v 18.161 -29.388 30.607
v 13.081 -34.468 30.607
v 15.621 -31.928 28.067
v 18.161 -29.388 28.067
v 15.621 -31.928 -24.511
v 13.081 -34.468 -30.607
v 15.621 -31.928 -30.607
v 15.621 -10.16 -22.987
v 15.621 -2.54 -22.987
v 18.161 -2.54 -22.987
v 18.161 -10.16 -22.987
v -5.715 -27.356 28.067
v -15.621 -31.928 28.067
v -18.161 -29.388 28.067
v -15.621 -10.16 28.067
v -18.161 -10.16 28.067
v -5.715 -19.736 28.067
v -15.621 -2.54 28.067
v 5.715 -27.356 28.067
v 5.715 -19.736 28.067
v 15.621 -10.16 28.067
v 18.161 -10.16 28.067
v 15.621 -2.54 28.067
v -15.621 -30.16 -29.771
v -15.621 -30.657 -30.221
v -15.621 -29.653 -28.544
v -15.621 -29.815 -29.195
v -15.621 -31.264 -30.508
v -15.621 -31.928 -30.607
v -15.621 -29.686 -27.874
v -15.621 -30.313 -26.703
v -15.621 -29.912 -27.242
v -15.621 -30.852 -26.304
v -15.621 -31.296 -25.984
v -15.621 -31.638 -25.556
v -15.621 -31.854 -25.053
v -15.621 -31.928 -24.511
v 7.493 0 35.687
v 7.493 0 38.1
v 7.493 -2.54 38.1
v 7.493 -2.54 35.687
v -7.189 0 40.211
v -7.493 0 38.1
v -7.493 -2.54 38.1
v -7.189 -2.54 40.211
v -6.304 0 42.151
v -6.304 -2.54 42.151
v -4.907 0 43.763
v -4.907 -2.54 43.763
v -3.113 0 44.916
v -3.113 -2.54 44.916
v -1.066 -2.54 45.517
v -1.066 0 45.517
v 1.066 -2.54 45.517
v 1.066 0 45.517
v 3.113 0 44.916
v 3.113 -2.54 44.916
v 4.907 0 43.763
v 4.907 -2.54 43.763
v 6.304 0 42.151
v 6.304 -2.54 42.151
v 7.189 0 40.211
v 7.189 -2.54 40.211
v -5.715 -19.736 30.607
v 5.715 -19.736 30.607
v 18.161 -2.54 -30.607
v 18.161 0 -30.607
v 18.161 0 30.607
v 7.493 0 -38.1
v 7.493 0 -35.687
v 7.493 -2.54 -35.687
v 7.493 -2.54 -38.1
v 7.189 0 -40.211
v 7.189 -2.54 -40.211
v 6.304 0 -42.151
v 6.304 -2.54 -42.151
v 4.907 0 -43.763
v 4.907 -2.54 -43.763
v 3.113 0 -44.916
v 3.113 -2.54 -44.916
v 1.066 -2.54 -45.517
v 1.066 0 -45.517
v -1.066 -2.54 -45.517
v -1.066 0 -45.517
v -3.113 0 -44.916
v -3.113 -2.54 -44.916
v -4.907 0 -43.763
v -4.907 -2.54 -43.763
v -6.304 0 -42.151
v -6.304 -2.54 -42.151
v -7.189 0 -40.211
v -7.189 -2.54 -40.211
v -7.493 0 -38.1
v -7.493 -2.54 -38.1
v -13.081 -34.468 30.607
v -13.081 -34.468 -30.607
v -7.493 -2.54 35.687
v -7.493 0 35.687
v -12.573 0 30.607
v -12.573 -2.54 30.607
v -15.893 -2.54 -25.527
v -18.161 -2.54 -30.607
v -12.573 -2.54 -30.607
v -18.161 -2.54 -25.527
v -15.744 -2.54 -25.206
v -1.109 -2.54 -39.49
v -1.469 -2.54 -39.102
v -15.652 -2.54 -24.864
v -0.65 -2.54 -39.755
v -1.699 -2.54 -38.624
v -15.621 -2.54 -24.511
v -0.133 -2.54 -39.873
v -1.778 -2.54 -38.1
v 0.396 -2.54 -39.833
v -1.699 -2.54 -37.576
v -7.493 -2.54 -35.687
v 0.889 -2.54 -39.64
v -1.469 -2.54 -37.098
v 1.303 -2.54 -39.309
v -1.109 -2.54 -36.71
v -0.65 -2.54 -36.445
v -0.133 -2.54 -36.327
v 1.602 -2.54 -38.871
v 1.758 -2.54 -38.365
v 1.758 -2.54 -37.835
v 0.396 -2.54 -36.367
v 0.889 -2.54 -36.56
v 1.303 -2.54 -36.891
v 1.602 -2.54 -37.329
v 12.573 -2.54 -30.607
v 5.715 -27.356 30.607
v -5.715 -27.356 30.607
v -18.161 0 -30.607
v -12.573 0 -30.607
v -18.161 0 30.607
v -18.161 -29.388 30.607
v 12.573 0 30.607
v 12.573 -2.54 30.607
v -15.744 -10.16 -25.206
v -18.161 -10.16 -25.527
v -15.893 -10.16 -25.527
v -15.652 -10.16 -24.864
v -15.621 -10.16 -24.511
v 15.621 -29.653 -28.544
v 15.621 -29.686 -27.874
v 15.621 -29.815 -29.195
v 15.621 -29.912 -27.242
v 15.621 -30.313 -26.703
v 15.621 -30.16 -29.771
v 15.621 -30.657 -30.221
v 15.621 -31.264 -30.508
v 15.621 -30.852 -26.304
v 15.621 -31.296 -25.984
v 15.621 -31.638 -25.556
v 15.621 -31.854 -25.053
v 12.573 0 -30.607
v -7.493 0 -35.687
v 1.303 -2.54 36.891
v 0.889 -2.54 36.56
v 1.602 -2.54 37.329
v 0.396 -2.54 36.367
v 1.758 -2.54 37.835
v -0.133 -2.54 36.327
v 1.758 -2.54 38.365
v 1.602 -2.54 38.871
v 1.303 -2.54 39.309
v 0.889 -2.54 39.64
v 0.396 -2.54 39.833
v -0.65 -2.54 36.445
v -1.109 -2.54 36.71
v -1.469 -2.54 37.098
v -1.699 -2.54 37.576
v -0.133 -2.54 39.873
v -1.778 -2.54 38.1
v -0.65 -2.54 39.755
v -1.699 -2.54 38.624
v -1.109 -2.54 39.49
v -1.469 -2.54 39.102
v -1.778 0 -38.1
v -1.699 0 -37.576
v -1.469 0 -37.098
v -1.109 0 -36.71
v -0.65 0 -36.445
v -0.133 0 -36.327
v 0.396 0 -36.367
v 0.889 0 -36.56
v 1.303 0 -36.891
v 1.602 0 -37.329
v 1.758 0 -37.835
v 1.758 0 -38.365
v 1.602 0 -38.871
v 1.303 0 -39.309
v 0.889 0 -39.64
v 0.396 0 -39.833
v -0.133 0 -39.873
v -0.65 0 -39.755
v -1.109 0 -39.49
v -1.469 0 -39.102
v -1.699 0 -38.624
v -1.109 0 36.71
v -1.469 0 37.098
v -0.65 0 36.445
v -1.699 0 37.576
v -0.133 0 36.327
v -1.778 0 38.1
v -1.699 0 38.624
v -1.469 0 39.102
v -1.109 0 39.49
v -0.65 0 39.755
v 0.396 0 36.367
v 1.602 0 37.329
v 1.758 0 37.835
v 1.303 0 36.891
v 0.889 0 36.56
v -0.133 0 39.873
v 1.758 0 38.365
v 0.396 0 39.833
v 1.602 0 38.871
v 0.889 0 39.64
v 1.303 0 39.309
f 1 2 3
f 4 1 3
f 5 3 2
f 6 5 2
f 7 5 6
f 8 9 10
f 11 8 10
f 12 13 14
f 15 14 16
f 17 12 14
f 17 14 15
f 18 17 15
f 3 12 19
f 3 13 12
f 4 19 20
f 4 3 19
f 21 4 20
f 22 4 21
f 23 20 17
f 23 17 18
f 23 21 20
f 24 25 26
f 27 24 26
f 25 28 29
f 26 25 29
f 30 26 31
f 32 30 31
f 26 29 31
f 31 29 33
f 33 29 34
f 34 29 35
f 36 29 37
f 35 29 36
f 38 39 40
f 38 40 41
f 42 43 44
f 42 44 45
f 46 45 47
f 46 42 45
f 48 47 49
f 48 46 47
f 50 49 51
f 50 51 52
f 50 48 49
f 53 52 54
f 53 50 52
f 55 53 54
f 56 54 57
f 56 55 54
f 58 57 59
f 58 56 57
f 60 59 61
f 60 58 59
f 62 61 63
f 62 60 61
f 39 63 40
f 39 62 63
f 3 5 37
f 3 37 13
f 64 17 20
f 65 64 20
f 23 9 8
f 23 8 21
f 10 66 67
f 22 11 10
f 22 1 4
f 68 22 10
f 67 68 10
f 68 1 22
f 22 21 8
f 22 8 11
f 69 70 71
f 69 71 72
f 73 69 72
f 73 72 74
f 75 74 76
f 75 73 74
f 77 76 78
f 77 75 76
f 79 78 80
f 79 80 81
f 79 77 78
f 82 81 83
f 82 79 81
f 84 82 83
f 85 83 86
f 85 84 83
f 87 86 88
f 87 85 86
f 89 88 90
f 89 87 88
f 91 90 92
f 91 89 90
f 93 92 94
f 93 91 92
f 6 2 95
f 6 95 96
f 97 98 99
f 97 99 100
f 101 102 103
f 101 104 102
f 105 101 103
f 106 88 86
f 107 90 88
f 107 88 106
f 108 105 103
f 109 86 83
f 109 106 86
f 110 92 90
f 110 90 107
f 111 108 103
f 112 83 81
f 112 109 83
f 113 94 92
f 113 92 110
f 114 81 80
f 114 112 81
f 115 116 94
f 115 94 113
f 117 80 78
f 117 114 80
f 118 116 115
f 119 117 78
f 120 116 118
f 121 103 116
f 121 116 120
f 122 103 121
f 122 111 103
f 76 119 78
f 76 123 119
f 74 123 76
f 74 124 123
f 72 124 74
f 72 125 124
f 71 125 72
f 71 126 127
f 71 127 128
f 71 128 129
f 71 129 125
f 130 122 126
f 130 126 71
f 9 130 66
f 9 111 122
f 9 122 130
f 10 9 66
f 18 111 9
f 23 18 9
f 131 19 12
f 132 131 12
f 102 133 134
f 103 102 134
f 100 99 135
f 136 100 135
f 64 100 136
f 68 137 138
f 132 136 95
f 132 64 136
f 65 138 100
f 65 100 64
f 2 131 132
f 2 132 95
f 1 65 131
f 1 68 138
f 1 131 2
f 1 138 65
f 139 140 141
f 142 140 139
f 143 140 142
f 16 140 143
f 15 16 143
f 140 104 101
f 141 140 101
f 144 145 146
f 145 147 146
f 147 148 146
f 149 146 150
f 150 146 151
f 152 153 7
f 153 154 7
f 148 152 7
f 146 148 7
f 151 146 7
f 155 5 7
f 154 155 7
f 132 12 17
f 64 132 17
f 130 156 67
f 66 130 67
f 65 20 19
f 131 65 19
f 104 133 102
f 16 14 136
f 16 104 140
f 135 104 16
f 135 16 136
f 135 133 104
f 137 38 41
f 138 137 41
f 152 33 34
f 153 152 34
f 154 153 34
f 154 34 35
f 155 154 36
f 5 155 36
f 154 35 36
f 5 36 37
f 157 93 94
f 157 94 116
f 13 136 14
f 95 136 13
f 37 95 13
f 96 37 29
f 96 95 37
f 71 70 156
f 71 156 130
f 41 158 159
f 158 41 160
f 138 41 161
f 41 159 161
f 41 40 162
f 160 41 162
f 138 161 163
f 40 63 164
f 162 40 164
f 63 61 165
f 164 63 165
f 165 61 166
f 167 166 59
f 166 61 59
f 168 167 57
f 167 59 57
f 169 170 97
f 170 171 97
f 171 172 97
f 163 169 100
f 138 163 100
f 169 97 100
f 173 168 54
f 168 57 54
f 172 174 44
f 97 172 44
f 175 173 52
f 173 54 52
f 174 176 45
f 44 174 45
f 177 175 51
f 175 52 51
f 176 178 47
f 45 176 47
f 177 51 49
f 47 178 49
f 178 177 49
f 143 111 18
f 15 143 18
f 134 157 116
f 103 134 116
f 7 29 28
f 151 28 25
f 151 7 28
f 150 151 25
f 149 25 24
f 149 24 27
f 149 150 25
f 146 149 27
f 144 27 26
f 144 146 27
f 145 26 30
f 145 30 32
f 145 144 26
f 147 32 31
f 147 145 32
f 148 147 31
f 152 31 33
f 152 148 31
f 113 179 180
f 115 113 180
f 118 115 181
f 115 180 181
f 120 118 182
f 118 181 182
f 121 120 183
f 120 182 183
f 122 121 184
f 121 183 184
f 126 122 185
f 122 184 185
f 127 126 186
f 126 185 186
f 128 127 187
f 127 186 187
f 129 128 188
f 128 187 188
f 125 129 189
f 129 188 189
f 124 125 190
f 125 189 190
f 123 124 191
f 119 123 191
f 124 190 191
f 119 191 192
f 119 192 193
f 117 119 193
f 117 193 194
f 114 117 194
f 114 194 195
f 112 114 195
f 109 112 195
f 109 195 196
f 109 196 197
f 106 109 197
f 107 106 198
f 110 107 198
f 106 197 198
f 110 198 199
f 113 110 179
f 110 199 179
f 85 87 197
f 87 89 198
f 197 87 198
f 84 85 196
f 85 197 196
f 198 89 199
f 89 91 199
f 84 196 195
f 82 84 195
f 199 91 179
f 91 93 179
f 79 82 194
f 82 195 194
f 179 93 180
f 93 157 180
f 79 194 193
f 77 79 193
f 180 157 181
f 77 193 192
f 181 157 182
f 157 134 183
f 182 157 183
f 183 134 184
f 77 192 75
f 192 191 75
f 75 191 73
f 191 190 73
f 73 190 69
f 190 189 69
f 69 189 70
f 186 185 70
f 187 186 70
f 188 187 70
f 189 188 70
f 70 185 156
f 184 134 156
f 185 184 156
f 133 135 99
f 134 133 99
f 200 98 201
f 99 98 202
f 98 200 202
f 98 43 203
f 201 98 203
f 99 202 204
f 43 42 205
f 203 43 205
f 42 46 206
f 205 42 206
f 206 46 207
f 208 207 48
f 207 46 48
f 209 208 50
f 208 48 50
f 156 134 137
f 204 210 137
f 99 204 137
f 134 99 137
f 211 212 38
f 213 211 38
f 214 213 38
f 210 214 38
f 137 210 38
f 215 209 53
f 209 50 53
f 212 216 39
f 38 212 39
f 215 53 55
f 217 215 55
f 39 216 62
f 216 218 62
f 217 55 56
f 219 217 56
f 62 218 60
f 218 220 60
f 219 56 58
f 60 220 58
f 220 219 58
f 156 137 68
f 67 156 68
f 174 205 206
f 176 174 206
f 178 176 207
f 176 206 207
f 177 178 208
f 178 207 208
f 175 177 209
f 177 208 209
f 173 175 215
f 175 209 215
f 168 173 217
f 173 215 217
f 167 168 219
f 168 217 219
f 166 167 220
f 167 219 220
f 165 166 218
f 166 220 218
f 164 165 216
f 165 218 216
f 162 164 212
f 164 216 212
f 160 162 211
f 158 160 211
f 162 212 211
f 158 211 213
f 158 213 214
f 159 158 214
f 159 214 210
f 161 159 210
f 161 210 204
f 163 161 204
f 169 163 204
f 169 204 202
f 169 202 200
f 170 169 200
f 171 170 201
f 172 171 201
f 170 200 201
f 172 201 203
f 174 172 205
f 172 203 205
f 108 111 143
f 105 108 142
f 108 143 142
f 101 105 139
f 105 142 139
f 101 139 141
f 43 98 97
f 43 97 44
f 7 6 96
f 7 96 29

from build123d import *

# Parameters (mm, degrees)
F1_DEPTH       = 2.54
F3_DEPTH       = 36.322
F4_W           = 2.5400000004
F4_H           = 53.594
F4_W_2         = 2.5400000003
F4_H_2         = 51.054
F5_DEPTH       = 7.62
F6_R           = 2.032
F7_SIZE        = 5.08
F8_SIZE        = 5.08
F10_DEPTH      = 31.9278
F12_R          = 1.778
F13_DEPTH      = 2.54
F14_SIZE       = 5.08
F16_DEPTH      = 2.54
F16_DEPTH_BACK = 25.4


with BuildPart() as f1:
    # F0 (on Front) → F1 (new body)
    with BuildSketch(Plane.XZ):
        Polygon((18.161, 9.3117938122), (18.161, 30.607), (-18.161, 30.607), (-18.161, 9.3117938122), (-18.161, -9.3117938122), (-18.161, -30.607), (18.161, -30.607), (18.161, -9.3117938122), align=None)
    extrude(amount=F1_DEPTH)

    # F2 (on face) → F3 (join, through all)
    with BuildSketch(Plane.YZ.offset(18.161)):
        Polygon((-2.54, 28.067), (-2.54, 30.607), (-34.4678, 30.607), (-34.4678, -30.607), (-31.9278, -30.607), (-31.9278, -26.035), (-31.9278, 28.067), align=None)
        with BuildLine():
            ThreePointArc((-31.9278, -30.607), (-29.6418, -28.321), (-31.9278, -26.035))
            Line((-31.9278, -26.035), (-31.9278, -30.607))
        make_face()
    extrude(amount=-F3_DEPTH)

    # F4 (on face) → F5 (join)
    with BuildSketch(Plane.XZ.offset(2.54)):
        with Locations((-16.8910000002, 1.27)):
            Rectangle(F4_W, F4_H)
        with Locations((16.8909999998, 2.54)):
            Rectangle(F4_W_2, F4_H_2)
    extrude(amount=F5_DEPTH)

    # F6
    f6_edges = [f1.edges().sort_by_distance(p)[0] for p in [
        (0, -31.9278, -30.607),
        (0, -31.9278, -26.035),
    ]]
    fillet(f6_edges, radius=F6_R)

    # F7
    f7_edges = [f1.edges().sort_by_distance(p)[0] for p in [
        (18.161, -34.4678, 0),
    ]]
    chamfer(f7_edges, length=F7_SIZE)

    # F8
    f8_edges = [f1.edges().sort_by_distance(p)[0] for p in [
        (-18.161, -34.4678, 0),
    ]]
    chamfer(f8_edges, length=F8_SIZE)

    # F9 (on face) → F10 (cut, through all)
    with BuildSketch(Plane.XZ.offset(34.4678)):
        with BuildLine():
            ThreePointArc((-15.621, -24.511), (-15.910574375, -25.556455375), (-16.6967647059, -26.3039411765))
            ThreePointArc((-16.6967647059, -26.3039411765), (-17.8387457553, -28.8754364388), (-15.621, -30.607))
            Line((-15.621, -30.607), (-15.621, -24.511))
        make_face()
        with BuildLine():
            ThreePointArc((15.621, -30.607), (17.8387457553, -28.8754364388), (16.6967647059, -26.3039411765))
            ThreePointArc((16.6967647059, -26.3039411765), (15.910574375, -25.556455375), (15.621, -24.511))
            Line((15.621, -24.511), (15.621, -30.607))
        make_face()
    extrude(amount=-F10_DEPTH, mode=Mode.SUBTRACT)

    # F12 (on face) → F13 (join, through all)
    with BuildSketch(Plane(origin=(0, 0, 0), x_dir=(-1, 0, 0), z_dir=(0, 1, 0))):
        with BuildLine():
            Line((-7.493, 38.1), (-7.493, 30.607))
            Line((-7.493, 30.607), (7.493, 30.607))
            Line((7.493, 30.607), (7.493, 38.1))
            ThreePointArc((7.493, 38.1), (0, 45.593), (-7.493, 38.1))
        make_face()
        with Locations((0, 38.1)):
            Circle(F12_R, mode=Mode.SUBTRACT)
        with BuildLine():
            Line((-6.35, -30.607), (-7.493, -30.607))
            Line((-7.493, -30.607), (-7.493, -38.1))
            ThreePointArc((-7.493, -38.1), (0, -45.593), (7.493, -38.1))
            Line((7.493, -38.1), (7.493, -30.607))
            Line((7.493, -30.607), (6.35, -30.607))
            Line((6.35, -30.607), (0, -30.607))
            Line((0, -30.607), (-6.35, -30.607))
        make_face()
        with Locations((0, -38.1)):
            Circle(F12_R, mode=Mode.SUBTRACT)
    extrude(amount=-F13_DEPTH)

    # F14
    f14_edges = [f1.edges().sort_by_distance(p)[0] for p in [
        (-7.493, -1.27, -30.607),
        (7.493, -1.27, -30.607),
        (7.493, -1.27, 30.607),
        (-7.493, -1.27, 30.607),
    ]]
    chamfer(f14_edges, length=F14_SIZE)

    # F15 (on face) → F16 (cut, two sides)
    with BuildSketch(Plane(origin=(0, 0, 28.067), x_dir=(1, 0, 0), z_dir=(0, 0, -1))) as f16_sk:
        Polygon((5.715, 27.3558), (0, 27.3558), (-5.715, 27.3558), (-5.715, 19.7358), (5.715, 19.7358), align=None)
    extrude(amount=-F16_DEPTH, mode=Mode.SUBTRACT)
    extrude(f16_sk.sketch, amount=F16_DEPTH_BACK, mode=Mode.SUBTRACT)


solid = f1.part
